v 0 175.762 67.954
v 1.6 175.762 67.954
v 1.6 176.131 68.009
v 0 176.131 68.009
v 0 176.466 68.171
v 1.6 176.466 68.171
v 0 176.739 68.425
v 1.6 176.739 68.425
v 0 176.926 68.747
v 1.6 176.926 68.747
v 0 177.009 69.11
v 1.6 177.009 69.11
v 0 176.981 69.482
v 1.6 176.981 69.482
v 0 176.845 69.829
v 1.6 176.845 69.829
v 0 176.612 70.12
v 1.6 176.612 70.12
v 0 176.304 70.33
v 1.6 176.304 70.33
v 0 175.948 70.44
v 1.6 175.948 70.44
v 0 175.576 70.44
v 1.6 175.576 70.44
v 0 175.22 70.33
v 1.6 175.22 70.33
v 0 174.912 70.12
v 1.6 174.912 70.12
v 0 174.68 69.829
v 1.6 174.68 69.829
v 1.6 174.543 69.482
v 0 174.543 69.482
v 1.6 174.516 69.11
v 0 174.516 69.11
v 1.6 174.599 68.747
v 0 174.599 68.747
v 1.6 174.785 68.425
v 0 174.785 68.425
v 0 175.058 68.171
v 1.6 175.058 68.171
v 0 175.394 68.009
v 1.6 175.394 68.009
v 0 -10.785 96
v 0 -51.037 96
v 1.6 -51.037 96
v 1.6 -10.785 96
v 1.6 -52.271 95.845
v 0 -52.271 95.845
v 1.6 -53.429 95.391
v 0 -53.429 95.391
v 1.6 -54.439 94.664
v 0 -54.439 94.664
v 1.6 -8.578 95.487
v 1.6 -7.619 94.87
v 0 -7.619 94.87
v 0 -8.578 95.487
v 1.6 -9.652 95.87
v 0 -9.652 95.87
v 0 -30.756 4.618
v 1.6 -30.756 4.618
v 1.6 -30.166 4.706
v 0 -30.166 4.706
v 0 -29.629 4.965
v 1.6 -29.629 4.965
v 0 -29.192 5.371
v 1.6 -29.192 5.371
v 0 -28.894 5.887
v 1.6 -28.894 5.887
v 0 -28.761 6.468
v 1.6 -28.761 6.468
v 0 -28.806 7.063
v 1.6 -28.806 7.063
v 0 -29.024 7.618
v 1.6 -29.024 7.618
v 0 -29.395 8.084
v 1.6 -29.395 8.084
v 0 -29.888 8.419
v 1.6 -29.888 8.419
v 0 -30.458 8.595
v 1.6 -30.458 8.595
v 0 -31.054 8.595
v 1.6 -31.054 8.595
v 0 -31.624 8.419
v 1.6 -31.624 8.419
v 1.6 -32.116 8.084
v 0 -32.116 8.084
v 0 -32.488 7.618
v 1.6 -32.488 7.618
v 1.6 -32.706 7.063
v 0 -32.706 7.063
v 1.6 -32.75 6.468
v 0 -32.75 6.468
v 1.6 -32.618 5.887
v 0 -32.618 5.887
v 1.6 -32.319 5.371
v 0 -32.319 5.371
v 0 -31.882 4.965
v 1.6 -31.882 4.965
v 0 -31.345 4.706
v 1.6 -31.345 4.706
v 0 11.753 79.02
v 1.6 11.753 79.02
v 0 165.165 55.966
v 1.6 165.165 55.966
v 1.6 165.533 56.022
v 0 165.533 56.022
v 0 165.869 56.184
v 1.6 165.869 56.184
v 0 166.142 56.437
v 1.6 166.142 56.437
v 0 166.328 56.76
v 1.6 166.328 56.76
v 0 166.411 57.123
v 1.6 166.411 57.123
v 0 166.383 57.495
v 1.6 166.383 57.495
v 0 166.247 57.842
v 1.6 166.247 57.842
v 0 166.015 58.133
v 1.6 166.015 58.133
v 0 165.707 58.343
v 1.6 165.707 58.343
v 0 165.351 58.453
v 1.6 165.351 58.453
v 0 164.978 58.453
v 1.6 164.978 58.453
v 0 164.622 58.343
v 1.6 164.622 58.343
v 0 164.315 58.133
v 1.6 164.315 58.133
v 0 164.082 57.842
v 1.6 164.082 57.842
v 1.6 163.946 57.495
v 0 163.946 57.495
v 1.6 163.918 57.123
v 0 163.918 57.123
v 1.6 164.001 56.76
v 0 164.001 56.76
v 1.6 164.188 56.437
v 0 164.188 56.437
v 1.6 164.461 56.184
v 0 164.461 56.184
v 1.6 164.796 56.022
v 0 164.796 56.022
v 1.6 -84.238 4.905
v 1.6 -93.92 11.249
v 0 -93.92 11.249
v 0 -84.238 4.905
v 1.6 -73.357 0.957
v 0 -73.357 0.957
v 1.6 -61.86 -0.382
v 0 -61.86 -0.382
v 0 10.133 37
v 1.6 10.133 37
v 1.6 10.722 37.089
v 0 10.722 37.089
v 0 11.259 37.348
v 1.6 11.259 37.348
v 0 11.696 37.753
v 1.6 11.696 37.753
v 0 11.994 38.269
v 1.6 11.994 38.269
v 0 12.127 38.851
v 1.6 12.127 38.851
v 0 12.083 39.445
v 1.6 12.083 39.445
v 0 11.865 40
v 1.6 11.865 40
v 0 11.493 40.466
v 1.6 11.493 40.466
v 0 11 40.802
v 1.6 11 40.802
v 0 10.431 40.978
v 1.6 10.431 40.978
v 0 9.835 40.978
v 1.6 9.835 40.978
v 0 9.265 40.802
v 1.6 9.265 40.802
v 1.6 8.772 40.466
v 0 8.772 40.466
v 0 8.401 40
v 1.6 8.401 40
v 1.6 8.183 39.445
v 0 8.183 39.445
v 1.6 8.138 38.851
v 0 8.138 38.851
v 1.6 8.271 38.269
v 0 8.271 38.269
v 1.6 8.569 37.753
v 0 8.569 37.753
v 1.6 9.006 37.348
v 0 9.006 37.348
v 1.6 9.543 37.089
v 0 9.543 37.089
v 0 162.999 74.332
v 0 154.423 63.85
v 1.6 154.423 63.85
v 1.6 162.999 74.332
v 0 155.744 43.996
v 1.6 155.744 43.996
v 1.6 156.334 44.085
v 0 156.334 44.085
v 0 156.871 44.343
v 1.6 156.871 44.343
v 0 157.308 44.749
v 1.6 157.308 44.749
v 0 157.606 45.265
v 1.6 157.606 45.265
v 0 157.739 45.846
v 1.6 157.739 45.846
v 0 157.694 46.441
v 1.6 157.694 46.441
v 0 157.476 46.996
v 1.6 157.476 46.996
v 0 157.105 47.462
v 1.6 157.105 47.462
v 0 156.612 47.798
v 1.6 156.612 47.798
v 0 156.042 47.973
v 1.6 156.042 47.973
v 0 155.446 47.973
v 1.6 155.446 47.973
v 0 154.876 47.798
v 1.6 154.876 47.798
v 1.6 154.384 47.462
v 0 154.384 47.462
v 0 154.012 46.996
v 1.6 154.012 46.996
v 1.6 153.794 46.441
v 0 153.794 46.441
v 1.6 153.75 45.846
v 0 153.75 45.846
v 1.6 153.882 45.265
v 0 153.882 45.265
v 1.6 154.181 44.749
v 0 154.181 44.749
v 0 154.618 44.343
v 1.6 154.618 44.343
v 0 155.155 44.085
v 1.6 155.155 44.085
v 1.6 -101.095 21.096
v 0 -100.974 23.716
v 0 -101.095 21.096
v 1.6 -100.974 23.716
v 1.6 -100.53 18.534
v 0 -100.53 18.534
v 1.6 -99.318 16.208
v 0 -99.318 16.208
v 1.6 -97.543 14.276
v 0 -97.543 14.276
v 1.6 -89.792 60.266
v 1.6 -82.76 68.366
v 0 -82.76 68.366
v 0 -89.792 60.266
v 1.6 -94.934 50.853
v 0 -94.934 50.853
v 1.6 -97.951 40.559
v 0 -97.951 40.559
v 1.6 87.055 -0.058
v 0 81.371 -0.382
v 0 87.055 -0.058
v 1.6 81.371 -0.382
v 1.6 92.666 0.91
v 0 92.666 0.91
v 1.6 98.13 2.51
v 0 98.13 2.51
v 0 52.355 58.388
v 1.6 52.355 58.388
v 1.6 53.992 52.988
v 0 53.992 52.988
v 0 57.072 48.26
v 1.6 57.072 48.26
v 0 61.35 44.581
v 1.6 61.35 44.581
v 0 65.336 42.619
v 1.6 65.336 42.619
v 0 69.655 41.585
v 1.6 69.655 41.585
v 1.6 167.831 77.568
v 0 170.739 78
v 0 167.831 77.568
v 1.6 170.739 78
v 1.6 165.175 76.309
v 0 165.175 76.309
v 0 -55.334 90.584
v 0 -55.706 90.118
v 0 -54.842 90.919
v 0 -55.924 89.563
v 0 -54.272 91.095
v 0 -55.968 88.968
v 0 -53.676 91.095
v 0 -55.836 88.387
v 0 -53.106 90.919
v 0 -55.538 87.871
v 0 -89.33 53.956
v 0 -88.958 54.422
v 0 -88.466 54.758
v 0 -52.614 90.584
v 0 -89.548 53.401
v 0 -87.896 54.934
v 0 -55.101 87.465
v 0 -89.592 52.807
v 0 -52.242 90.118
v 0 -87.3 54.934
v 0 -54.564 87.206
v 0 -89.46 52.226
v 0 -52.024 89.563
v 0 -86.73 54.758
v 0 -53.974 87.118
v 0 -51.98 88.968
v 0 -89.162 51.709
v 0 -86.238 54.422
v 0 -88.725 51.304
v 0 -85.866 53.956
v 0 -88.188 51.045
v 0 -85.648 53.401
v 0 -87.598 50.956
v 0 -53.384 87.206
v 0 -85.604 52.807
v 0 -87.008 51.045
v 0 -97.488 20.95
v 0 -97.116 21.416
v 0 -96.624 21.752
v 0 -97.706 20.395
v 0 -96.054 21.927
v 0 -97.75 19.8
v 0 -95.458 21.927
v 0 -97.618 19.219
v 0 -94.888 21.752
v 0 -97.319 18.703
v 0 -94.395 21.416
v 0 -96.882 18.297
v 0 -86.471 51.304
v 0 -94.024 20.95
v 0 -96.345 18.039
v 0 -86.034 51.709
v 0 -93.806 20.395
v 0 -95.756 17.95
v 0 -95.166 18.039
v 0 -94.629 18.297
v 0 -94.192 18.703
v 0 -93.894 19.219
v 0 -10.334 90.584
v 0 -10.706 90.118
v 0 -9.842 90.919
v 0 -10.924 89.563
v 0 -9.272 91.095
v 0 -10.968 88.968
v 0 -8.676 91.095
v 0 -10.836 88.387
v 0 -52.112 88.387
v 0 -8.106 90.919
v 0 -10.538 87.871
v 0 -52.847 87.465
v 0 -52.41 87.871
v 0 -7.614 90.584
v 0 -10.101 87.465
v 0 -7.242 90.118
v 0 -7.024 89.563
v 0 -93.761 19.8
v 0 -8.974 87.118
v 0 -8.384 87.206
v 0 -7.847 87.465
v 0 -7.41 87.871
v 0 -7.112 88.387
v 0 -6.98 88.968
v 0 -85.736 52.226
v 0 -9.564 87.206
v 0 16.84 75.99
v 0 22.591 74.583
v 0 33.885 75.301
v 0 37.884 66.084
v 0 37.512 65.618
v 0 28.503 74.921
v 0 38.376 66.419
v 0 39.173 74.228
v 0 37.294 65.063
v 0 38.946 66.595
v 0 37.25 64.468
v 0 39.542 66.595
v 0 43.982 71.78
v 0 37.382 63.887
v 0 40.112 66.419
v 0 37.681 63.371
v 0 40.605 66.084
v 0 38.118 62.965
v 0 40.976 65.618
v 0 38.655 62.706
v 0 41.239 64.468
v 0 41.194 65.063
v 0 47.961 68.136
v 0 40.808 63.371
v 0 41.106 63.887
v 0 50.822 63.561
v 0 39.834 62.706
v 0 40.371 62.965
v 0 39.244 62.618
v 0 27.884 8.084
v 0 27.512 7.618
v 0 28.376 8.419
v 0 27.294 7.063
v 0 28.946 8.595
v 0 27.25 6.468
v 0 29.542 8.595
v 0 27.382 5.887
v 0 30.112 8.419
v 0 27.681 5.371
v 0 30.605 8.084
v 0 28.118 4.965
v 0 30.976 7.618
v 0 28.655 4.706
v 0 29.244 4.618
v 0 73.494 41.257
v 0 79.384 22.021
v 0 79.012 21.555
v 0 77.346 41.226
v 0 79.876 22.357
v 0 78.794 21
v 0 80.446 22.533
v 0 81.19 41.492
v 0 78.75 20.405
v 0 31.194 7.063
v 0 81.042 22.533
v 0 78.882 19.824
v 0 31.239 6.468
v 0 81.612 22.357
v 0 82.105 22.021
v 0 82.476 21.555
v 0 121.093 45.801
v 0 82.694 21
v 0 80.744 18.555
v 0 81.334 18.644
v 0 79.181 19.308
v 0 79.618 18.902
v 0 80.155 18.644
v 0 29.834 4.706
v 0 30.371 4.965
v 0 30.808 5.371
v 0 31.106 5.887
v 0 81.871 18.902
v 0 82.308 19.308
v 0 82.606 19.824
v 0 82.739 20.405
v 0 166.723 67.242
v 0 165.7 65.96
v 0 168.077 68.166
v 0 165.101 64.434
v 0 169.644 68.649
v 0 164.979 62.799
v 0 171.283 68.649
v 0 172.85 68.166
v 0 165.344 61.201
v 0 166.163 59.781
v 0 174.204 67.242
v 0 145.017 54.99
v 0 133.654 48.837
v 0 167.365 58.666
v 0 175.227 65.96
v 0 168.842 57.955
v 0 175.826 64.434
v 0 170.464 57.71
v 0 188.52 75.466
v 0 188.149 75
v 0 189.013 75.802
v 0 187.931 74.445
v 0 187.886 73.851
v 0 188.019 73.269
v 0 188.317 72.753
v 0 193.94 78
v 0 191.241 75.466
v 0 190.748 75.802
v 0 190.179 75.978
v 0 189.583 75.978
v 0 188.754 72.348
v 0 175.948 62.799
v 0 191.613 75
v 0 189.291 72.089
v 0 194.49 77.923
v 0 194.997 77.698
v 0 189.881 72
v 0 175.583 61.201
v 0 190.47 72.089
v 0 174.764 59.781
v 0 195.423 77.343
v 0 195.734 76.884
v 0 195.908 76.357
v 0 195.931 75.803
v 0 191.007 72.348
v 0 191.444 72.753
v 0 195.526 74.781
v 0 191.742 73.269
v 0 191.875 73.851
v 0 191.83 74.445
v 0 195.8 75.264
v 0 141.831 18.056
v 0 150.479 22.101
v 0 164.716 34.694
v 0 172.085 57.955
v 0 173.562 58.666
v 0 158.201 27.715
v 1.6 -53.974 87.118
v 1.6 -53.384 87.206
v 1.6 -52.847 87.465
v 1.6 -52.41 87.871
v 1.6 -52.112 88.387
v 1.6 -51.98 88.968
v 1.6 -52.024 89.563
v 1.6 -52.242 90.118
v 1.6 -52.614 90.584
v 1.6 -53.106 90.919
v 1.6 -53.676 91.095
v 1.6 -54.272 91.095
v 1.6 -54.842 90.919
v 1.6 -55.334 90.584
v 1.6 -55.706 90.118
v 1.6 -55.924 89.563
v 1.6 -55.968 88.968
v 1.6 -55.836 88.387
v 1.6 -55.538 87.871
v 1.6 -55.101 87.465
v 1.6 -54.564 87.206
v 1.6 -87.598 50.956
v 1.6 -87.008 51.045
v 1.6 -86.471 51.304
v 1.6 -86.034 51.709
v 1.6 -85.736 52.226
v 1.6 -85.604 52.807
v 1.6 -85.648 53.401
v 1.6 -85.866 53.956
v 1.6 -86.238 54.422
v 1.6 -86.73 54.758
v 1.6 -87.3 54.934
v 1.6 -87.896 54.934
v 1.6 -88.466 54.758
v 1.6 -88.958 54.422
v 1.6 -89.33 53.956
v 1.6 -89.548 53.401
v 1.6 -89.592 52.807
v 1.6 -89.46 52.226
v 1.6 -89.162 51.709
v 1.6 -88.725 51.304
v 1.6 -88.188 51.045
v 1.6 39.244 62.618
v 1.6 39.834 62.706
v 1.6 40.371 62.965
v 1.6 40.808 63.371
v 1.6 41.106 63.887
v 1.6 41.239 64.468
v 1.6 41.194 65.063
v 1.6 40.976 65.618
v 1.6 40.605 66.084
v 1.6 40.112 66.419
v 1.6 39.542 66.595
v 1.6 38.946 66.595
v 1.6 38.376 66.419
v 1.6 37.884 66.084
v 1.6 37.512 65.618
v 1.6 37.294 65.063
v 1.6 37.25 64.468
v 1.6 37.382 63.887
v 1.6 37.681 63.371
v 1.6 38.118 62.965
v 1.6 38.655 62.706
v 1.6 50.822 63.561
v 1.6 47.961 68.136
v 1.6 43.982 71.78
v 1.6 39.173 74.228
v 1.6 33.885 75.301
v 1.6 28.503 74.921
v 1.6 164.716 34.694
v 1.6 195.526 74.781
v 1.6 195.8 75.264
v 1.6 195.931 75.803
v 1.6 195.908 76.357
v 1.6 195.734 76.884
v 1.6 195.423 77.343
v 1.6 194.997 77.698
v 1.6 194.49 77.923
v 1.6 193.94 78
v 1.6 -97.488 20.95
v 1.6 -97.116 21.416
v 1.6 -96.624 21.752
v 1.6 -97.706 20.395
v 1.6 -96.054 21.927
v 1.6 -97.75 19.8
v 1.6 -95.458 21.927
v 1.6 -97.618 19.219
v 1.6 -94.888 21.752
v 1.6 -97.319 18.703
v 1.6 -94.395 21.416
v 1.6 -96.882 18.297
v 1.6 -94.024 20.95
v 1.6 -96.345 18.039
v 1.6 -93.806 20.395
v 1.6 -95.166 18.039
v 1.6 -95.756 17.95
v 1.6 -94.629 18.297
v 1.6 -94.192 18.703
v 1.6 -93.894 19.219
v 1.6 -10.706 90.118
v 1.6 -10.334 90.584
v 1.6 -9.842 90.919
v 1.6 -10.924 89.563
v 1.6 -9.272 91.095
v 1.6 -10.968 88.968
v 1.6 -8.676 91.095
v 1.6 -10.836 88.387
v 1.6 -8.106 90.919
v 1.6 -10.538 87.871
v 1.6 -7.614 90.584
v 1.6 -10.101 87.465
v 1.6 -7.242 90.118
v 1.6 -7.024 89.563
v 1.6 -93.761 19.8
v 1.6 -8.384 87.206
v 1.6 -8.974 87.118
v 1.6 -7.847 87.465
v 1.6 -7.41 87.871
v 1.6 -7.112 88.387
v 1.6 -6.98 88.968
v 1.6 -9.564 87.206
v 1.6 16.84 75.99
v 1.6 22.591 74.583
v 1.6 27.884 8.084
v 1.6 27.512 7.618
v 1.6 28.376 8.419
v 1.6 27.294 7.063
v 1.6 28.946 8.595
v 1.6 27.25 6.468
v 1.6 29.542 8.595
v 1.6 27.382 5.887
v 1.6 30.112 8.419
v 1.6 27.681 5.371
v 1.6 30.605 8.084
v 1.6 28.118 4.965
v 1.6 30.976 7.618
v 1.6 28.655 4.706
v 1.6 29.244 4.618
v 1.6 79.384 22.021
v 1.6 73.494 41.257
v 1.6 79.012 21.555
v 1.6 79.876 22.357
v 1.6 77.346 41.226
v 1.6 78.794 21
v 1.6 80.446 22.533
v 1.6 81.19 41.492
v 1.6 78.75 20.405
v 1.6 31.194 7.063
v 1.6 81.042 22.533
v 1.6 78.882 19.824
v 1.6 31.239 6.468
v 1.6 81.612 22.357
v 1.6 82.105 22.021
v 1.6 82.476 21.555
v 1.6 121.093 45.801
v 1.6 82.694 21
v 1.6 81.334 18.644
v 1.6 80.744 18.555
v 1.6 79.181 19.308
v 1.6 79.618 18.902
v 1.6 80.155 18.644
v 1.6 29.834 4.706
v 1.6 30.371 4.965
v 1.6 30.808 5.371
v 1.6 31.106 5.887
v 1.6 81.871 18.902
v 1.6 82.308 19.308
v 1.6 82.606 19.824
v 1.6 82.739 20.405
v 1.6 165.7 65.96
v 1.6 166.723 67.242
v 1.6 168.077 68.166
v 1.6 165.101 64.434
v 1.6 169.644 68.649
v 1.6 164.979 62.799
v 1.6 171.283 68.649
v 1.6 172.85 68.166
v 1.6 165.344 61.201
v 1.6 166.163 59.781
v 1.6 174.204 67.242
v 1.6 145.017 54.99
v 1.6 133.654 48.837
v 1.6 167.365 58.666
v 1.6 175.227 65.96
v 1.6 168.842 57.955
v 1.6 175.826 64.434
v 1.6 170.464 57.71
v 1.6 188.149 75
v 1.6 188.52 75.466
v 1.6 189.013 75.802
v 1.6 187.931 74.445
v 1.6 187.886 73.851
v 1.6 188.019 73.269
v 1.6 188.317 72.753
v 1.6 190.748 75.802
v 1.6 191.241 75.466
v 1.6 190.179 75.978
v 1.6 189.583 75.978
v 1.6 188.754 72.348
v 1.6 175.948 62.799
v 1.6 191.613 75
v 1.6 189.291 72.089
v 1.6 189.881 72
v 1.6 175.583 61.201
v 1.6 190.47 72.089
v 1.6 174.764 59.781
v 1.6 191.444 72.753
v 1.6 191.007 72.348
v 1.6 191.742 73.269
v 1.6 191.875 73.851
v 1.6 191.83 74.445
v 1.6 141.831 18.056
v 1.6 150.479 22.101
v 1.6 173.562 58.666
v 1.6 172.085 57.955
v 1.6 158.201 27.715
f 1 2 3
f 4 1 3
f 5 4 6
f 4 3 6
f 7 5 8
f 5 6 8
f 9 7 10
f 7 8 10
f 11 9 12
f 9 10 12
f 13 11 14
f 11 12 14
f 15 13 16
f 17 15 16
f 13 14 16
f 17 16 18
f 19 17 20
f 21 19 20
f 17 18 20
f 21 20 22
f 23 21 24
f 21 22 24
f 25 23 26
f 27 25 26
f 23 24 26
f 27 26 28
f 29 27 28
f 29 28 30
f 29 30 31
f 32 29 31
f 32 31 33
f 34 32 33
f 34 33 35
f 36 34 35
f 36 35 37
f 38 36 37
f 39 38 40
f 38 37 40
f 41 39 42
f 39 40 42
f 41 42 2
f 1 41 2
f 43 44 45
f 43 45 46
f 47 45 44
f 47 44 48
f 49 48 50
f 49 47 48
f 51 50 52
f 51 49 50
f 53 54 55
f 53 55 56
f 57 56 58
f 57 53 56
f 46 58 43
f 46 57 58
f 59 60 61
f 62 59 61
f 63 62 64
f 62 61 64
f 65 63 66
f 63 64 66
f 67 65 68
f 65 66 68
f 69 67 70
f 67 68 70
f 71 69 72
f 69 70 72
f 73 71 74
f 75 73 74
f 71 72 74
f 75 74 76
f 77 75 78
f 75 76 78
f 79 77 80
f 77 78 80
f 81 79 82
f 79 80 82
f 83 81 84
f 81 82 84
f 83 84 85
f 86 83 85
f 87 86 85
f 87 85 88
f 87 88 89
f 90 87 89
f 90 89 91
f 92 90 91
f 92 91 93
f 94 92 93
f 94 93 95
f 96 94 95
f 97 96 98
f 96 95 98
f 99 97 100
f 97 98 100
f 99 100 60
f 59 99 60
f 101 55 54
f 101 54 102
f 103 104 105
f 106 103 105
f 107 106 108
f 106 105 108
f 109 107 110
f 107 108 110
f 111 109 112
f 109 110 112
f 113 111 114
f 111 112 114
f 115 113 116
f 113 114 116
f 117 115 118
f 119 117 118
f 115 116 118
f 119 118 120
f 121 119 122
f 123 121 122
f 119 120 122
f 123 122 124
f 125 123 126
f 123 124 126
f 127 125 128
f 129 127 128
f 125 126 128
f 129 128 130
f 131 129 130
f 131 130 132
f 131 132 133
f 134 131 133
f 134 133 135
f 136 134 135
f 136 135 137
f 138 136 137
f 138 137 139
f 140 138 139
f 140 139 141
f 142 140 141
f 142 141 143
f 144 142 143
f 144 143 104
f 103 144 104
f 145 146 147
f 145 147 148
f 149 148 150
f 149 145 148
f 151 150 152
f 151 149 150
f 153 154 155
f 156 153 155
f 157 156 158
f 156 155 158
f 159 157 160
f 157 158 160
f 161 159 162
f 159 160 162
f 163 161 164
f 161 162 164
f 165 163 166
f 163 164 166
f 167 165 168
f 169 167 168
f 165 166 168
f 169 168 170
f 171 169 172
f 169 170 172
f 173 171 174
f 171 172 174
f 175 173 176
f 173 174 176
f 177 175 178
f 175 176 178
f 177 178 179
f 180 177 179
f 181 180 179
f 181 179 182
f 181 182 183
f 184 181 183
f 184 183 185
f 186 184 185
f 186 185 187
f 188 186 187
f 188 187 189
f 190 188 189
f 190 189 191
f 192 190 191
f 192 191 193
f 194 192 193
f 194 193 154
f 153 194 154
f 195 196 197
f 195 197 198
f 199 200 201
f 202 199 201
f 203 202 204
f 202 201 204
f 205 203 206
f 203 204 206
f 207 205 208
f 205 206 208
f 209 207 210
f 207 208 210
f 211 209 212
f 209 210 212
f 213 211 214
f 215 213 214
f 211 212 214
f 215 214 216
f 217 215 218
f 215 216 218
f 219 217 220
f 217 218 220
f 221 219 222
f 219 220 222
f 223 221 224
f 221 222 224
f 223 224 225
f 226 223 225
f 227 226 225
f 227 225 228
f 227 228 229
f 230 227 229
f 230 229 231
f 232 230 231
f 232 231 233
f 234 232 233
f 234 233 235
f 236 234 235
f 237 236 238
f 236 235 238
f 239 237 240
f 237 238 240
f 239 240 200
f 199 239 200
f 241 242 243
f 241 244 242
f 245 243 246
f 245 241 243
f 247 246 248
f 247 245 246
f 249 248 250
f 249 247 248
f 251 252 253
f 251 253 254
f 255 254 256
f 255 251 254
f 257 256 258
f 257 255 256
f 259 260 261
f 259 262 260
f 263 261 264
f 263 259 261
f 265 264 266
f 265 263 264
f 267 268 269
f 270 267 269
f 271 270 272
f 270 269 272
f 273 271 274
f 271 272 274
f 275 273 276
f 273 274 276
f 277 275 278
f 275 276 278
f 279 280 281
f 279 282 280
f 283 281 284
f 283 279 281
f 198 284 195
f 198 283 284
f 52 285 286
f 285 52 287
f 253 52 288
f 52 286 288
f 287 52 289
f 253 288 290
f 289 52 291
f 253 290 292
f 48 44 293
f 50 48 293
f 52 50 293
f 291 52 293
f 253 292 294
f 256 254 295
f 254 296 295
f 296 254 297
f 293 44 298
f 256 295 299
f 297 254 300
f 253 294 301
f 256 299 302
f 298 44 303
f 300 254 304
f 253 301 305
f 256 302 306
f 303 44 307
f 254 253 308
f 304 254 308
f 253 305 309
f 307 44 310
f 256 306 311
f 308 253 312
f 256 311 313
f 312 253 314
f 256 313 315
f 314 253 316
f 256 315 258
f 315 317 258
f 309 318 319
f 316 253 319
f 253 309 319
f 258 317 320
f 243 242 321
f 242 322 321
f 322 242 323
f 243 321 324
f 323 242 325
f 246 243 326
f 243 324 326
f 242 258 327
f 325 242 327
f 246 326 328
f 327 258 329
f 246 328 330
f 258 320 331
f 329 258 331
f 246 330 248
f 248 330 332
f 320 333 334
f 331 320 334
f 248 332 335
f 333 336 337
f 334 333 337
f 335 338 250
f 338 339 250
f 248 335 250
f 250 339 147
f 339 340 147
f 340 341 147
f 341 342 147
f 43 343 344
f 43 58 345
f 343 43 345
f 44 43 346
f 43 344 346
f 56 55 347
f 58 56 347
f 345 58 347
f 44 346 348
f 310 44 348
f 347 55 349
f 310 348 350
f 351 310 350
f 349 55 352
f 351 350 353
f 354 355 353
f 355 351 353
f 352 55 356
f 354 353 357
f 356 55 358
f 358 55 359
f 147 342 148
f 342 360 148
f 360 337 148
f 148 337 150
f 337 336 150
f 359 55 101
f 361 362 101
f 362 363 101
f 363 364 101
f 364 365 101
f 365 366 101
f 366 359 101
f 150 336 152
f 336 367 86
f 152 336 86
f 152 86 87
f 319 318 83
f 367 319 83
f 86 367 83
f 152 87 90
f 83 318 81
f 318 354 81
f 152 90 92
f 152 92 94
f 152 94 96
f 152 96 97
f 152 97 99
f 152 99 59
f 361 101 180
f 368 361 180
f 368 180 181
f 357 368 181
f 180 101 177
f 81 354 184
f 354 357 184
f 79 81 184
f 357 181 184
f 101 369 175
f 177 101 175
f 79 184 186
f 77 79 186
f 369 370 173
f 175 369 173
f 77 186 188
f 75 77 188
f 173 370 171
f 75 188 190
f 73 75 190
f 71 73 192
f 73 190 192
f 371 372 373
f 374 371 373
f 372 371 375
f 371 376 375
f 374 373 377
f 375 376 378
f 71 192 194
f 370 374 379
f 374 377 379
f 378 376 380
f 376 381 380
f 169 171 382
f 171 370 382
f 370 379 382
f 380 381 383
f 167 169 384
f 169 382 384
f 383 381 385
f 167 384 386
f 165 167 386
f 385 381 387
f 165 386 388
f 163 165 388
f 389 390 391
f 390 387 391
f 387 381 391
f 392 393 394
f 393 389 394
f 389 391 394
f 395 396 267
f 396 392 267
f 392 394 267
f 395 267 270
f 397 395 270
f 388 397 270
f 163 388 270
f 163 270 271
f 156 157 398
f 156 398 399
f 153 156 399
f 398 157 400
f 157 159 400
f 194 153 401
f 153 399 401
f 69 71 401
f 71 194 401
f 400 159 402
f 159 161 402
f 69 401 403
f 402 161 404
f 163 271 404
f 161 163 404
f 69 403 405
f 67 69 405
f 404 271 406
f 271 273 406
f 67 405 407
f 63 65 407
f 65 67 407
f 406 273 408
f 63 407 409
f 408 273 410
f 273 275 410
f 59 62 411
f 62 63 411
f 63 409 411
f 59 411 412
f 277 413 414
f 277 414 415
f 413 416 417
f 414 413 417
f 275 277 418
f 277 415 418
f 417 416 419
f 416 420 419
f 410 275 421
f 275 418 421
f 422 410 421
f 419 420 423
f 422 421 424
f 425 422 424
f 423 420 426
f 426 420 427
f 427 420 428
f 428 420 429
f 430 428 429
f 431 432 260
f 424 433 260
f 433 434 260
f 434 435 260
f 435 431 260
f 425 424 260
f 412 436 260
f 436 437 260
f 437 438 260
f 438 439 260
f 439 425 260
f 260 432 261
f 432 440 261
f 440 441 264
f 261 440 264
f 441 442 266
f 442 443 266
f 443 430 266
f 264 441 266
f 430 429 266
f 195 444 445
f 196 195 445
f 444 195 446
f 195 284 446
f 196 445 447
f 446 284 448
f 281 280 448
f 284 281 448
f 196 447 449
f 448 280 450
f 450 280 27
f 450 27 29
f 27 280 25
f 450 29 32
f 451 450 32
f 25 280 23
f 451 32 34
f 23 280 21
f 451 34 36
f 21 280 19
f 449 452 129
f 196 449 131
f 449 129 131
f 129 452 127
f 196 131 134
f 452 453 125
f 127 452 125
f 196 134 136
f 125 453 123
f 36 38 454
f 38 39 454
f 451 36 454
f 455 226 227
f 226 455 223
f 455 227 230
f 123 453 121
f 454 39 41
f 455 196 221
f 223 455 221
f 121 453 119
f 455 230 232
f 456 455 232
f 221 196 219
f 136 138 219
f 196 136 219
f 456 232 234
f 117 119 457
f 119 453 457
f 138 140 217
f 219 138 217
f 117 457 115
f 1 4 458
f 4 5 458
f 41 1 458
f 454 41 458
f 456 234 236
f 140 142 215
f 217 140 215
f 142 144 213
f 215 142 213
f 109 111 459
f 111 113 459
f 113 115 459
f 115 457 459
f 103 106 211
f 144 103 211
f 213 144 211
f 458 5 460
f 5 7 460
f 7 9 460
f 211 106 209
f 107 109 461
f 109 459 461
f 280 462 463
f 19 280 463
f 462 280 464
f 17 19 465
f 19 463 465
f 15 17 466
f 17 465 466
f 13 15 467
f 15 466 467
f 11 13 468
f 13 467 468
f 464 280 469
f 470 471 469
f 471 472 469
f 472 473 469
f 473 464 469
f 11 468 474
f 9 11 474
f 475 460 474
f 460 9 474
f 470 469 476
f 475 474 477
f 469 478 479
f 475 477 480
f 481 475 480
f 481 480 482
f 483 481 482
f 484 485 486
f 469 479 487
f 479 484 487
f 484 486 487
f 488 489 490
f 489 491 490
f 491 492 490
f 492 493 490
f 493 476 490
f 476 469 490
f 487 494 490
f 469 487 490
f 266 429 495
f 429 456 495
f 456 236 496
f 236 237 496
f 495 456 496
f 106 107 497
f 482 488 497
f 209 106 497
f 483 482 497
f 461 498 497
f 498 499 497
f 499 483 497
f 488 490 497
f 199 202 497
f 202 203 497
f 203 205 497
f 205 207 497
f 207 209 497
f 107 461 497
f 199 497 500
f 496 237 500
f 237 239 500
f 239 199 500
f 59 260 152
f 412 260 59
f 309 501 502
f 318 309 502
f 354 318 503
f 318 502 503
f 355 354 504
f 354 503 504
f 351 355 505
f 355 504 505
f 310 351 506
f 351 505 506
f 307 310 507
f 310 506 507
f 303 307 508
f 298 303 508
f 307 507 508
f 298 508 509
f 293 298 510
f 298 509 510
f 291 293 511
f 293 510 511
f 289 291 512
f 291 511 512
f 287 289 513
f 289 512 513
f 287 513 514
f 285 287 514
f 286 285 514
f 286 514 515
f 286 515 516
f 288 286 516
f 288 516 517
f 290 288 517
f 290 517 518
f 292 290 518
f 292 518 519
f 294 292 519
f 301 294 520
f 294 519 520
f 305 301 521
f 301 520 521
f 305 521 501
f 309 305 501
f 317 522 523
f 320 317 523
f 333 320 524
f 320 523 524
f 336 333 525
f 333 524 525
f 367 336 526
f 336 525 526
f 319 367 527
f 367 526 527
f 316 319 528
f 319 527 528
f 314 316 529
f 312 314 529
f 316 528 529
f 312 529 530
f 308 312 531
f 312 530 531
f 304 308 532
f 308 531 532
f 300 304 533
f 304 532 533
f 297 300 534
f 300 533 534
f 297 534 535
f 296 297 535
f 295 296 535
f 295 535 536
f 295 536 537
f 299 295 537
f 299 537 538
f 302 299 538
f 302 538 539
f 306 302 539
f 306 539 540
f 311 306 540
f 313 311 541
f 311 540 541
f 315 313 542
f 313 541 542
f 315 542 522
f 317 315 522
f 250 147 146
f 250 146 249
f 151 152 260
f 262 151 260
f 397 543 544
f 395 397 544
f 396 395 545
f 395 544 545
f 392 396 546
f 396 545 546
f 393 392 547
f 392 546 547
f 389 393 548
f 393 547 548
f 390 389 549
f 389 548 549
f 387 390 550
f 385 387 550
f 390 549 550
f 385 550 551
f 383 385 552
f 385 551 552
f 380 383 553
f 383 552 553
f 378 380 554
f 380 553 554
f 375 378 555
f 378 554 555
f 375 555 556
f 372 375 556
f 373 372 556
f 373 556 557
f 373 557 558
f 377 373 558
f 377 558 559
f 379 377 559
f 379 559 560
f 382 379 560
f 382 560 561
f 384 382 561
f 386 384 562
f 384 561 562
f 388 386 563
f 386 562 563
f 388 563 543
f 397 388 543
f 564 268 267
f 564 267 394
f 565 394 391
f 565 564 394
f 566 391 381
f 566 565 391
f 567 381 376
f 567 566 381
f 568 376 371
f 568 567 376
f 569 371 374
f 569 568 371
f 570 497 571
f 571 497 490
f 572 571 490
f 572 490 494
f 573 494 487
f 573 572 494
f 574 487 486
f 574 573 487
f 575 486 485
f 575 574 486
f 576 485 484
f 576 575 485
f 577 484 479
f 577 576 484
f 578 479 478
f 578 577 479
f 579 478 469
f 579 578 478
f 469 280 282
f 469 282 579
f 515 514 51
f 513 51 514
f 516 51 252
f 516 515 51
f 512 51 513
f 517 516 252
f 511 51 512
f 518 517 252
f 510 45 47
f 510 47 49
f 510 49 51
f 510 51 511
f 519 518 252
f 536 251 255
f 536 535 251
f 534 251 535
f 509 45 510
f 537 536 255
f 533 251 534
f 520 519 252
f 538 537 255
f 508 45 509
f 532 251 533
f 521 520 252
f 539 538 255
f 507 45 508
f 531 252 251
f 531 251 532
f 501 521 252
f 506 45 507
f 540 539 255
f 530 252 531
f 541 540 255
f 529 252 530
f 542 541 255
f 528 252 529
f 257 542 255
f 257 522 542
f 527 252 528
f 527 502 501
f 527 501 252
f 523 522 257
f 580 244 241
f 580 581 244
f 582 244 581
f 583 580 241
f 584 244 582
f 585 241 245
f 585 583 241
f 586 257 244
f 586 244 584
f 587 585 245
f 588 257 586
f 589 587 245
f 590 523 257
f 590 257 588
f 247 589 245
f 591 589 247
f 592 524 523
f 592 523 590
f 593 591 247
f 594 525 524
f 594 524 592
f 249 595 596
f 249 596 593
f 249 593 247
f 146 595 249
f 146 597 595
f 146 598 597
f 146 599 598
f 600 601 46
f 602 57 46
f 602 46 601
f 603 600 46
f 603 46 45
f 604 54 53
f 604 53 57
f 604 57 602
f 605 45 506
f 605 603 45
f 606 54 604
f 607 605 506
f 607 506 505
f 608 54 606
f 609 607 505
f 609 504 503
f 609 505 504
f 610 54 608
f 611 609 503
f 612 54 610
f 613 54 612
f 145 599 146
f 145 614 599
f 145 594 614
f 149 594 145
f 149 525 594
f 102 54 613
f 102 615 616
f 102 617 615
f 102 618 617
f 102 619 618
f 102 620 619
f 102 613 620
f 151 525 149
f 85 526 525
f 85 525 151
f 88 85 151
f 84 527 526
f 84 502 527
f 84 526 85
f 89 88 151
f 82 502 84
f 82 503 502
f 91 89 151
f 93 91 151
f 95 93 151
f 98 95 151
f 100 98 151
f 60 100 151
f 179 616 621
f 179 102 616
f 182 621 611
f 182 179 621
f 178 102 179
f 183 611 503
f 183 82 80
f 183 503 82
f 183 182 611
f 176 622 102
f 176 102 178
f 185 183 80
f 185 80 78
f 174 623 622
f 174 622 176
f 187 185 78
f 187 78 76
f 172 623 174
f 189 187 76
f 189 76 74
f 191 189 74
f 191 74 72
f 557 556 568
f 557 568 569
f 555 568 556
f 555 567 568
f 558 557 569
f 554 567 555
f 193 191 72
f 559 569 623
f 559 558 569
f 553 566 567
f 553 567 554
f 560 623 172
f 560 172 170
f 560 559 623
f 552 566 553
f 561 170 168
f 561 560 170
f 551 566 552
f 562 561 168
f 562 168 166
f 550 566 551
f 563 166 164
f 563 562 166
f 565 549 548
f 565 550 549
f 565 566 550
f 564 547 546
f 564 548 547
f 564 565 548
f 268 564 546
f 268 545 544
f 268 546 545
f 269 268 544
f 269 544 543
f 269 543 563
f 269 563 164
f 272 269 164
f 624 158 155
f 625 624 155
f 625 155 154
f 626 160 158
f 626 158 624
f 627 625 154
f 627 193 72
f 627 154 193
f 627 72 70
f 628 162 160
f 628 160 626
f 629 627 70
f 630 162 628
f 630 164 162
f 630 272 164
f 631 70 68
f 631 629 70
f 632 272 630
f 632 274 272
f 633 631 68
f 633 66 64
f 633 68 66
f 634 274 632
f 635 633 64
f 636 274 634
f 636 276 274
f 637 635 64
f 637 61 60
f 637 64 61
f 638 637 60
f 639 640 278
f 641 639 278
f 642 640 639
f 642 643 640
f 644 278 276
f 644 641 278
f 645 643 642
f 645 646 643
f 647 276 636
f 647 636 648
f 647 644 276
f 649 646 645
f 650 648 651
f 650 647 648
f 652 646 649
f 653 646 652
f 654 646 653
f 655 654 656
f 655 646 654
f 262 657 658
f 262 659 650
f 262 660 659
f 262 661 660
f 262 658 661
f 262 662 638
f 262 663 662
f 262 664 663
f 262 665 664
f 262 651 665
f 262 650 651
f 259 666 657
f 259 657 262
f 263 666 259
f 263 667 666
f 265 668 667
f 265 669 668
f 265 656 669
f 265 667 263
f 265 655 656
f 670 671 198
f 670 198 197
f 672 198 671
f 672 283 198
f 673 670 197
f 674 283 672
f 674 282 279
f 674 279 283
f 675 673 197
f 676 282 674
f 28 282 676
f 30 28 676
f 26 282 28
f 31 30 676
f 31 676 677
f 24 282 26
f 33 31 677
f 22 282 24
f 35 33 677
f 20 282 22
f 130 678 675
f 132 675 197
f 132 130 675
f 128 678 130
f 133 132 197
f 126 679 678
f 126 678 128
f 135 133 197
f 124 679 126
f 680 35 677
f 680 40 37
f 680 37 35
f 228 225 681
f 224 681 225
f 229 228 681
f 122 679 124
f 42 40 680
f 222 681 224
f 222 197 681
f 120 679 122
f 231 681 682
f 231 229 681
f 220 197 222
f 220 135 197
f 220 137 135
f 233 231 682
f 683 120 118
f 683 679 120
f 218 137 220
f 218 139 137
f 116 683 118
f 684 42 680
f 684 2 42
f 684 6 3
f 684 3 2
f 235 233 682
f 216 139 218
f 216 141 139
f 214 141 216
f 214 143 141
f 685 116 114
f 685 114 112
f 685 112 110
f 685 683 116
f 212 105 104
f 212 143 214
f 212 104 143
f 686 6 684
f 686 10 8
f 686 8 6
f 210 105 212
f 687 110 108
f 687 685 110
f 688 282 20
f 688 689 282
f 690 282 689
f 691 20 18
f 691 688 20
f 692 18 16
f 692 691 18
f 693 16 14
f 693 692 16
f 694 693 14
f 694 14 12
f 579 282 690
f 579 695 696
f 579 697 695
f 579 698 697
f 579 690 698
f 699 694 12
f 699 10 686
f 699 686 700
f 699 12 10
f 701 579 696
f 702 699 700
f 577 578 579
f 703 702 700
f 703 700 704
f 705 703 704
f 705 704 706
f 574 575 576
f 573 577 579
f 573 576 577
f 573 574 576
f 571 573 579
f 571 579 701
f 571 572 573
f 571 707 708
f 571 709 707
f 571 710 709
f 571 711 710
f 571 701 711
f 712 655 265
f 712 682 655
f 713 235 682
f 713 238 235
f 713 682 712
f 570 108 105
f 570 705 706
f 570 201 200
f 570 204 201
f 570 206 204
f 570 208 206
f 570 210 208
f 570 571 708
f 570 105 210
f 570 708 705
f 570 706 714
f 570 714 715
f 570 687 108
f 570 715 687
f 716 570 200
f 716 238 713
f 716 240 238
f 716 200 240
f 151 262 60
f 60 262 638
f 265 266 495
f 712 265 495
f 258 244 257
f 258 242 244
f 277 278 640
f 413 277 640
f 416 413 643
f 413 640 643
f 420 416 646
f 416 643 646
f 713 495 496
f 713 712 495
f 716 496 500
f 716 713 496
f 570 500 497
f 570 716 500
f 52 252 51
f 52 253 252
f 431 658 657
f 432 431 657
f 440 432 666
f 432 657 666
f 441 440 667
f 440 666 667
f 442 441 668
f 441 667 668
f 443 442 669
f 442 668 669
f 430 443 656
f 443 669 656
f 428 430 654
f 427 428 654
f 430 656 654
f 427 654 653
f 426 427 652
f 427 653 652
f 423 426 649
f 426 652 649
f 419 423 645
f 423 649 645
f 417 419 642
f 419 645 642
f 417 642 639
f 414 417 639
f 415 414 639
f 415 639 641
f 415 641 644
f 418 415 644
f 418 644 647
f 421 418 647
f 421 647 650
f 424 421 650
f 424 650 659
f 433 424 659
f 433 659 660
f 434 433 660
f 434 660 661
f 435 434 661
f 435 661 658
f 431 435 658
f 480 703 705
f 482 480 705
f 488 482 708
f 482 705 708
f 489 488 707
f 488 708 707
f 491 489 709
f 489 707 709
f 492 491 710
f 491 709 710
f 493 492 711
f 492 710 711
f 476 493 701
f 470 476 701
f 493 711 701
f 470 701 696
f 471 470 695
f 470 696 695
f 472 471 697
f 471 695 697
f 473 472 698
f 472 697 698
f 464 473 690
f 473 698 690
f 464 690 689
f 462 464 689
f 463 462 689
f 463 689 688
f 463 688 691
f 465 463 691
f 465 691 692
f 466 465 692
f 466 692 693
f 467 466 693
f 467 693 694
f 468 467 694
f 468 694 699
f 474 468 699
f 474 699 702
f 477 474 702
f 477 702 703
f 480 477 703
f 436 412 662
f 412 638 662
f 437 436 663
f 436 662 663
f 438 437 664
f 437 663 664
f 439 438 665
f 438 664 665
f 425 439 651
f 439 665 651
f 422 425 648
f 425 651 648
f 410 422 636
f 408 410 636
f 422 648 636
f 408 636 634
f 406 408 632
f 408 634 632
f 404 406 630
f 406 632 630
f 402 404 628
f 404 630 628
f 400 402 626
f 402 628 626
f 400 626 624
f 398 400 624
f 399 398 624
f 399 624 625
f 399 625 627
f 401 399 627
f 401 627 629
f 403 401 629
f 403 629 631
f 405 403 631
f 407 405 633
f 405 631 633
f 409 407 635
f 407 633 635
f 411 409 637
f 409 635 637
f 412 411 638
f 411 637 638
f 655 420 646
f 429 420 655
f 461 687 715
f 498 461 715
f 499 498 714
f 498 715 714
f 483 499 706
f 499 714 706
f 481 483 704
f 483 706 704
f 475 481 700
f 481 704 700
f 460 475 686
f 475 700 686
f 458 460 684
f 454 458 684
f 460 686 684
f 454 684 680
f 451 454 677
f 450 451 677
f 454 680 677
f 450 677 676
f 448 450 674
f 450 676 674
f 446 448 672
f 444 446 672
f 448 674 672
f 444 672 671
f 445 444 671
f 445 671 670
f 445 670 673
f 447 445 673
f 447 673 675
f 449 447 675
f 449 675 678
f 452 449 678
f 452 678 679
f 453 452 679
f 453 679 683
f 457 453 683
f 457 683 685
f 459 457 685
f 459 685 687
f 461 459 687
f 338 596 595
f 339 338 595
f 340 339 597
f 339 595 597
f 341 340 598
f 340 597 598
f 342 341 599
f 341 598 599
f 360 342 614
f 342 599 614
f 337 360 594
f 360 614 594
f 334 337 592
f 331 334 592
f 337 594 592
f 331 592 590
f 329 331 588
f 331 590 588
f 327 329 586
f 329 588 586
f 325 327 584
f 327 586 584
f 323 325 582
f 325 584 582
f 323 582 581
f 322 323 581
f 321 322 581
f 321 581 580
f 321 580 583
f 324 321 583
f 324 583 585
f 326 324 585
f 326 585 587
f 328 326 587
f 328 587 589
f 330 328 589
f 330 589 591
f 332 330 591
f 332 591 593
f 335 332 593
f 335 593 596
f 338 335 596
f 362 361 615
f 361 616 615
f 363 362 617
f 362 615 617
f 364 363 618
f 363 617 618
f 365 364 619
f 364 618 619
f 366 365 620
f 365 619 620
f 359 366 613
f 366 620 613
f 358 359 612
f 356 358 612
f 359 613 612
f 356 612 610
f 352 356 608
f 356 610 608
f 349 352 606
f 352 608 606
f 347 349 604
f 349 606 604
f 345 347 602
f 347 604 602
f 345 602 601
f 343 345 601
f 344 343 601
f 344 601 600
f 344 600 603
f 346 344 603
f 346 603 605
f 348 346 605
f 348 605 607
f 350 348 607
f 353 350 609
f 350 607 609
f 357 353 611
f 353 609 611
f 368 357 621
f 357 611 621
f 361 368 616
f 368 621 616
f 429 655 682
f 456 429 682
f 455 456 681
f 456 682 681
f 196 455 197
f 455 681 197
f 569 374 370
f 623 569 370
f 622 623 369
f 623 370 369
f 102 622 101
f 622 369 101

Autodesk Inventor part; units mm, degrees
ref_plane "YZ Plane" through (0, 0, 0) normal (1, 0, 0) x (0, 1, 0)
ref_plane "XZ Plane" through (0, 0, 0) normal (0, 1, 0) x (-1, 0, 0)
ref_plane "XY Plane" through (0, 0, 0) normal (0, 0, 1) x (1, 0, 0)
sketch "Esquisse1" plane through (0, 0, 0) normal (1, 0, 0) x (0, 1, 0)
  line L0 (-80, -0.3825) -> (90, -0.3825)
  line L1 (90, -0.3825) -> (155.7273, 23)
  line L2 (155.7273, 23) -> (198, 78)
  line L3 (-80, -0.3825) -> (-102, 18)
  line L4 (-102, 18) -> (-95, 57)
  line L5 (-95, 57) -> (-53, 96)
  line L6 (-53, 96) -> (-9, 96)
  line L7 (-9, 96) -> (60.3686, 39.2438)
  line L8 (60.3686, 39.2438) -> (141.4545, 48)
  line L9 (141.4545, 48) -> (166, 78)
  line L10 (166, 78) -> (198, 78)
  point P0 (0, 0)
  dimension "d0" = 300
  dimension "d1" = 32
  dimension "d2" = 44
  dimension "d3" = 170
extrude "Extrusion1" add sketch "Esquisse1" along normal blind 1.6
fillet "Congé1" radius 50 6 edges at (0.8, -95, 57) (0.8, -80, -0.3825) (0.8, 60.3686, 39.2438) (0.8, 141.4545, 48) (0.8, 155.7273, 23) (0.8, 90, -0.3825)
fillet "Congé2" radius 10 1 edges at (0.8, -102, 18)
fillet "Congé3" radius 10 1 edges at (0.8, 166, 78)
fillet "Congé4" radius 2 1 edges at (0.8, 198, 78)
fillet "Congé5" radius 5 2 edges at (0.8, -9, 96) (0.8, -53, 96)
sketch "Esquisse2" plane through (1.6, 0, 0) normal (1, 0, 0) x (0, 0, -1)
  line L0 (-94.664, -54.4388) -> (-68.3658, -82.7599) projected
  arc A0 (-23.7165, -100.974) -> (-14.2761, -97.5432) centre (-21.9498, -91.1313) ccw projected
  line L1 (-14.2761, -97.5432) -> (-11.2486, -93.92) projected
  line L2 (0.3825, -61.8602) -> (0.3825, 81.3711) projected
  line L3 (-34.6945, 164.7156) -> (-74.7812, 195.5261) projected
  line L4 (-78, 193.9403) -> (-78, 170.7388) projected
  line L5 (-52.5054, 44.1601) -> (-94.8698, -7.6186) projected
  circle A1 centre (-89.1175, -53.974) radius 2
  circle A2 centre (-19.9498, -95.7558) radius 2
  circle A3 centre (-6.6175, -30.7558) radius 2
  circle A4 centre (-39, 10.1327) radius 2
  circle A5 centre (-20.5549, 80.7442) radius 2
  circle A6 centre (-45.9957, 155.7442) radius 2
  circle A7 centre (-6.6175, 29.2442) radius 2
  circle A8 centre (-74, 189.8806) radius 2
  line L6 (-40.5594, -97.9509) -> (-23.7165, -100.974) projected
  circle A9 centre (-52.9562, -87.598) radius 2
  circle A10 centre (-89.1175, -8.974) radius 2
  line L7 (-96, -10.7848) -> (-96, -51.0365) projected
  point P0 (-41.4923, 81.1901)
  point P1 (0, 0)
  dimension "d11" = 4
  dimension "d13" = 4
  dimension "d14" = 4
  dimension "d15" = 4
  dimension "d16" = 4
  dimension "d17" = 4
  dimension "d22" = 2
  dimension "d23" = 5.5
  dimension "d24" = 7
  dimension "d25" = 4
  dimension "d26" = 7
  dimension "d27" = 60
  dimension "d28" = 65
  dimension "d31" = 41.8748
  dimension "d32" = 20.9374
  dimension "d36" = 14
  dimension "d37" = 75
  dimension "d38" = 4
  dimension "d39" = 4
  dimension "d40" = 4
  dimension "d43" = 4
  dimension "d44" = 8
  dimension "d45" = 8
  dimension "d64" = 4
  dimension "d65" = 45
  dimension "d66" = 89.5
  dimension "d67" = 89.5
  dimension "d68" = 47
  dimension "d70" = 32
  dimension "d71" = 57
  dimension "d72" = 51.5
extrude "Extrusion2" cut sketch "Esquisse2" against normal blind 4
sketch "Esquisse3" plane through (1.6, 0, 0) normal (1, 0, 0) x (0, 0, -1)
  line L0 (-34.6945, 164.7156) -> (-74.7812, 195.5261) projected
  line L1 (-74.3324, 162.9992) -> (-63.8504, 154.423) projected
  circle A0 centre (-63.2102, 170.4635) radius 5.5
  line L2 (-52.7212, 161.1908) -> (-63.2102, 170.4635)
  line L3 (-63.2102, 170.4635) -> (-73.6991, 179.7361)
  circle A1 centre (-69.2039, 175.7621) radius 1.25
  circle A2 centre (-57.2165, 165.1648) radius 1.25
  point P0 (0, 0)
  dimension "d46" = 11
  dimension "d47" = 12.82
  dimension "d48" = 12.82
  dimension "d50" = 28
  dimension "d51" = 14
  dimension "d52" = 2.5
  dimension "d53" = 2.5
  dimension "d54" = 8
  dimension "d55" = 8
  dimension "d56" = 11.8599
extrude "Extrusion3" cut sketch "Esquisse3" against normal through all
sketch "Esquisse5" plane through (1.6, 0, 0) normal (1, 0, 0) x (0, 0, -1)
  circle A0 centre (-20.5549, 80.7442) radius 2 projected
  line L0 (-52.5054, 44.1601) -> (-94.8698, -7.6186) projected
  arc A1 (-47.0739, 50.7986) -> (-71.5553, 20.8768) centre (-55.3427, 32.5879) ccw
  line L1 (-47.0739, 50.7986) -> (-71.5553, 20.8768)
  point P0 (-96, -10.7848)
  point P1 (0, 0)
  dimension "d79" = 40
  dimension "d80" = 40
  dimension "d81" = 20
extrude "Extrusion5" add sketch "Esquisse5" against normal blind 1.6 contours L0 A1 L1
fillet "Congé7" radius 20 2 edges at (0.8, 20.8768, 71.5553) (0.8, 51.09, 47.7484)
sketch "Esquisse6" plane through (1.6, 0, 0) normal (1, 0, 0) x (0, 0, -1)
  line L0 (0.3825, -61.8602) -> (0.3825, 81.3711) projected
  circle A0 centre (-19.9498, -95.7558) radius 2 projected
  circle A1 centre (-64.6175, 39.2442) radius 2
  point P0 (0, 0)
  dimension "d85" = 4
  dimension "d86" = 65
  dimension "d87" = 135
extrude "Extrusion6" cut sketch "Esquisse6" against normal through all contours A1
equation "\"d13\" = d11"
equation "\"d14\" = d11"
equation "\"d15\" = d11"
equation "\"d16\" = d11"
equation "\"d17\" = d11"
equation "\"d25\" = d11"
equation "\"d26\" = d24"
equation "\"d32\" = 0.5 * d31"
equation "\"d38\" = d11"
equation "\"d43\" = d11"
equation "\"d64\" = d11"
equation "\"d67\" = d66"
equation "\"d41\" = d43"
equation "\"d47\" = d48"
equation "\"d51\" = 0.5 * d50"
equation "\"d53\" = d52"
equation "\"d55\" = d54"
properties part number "Cote_Droit" material "Fibre de verre - FR4"
